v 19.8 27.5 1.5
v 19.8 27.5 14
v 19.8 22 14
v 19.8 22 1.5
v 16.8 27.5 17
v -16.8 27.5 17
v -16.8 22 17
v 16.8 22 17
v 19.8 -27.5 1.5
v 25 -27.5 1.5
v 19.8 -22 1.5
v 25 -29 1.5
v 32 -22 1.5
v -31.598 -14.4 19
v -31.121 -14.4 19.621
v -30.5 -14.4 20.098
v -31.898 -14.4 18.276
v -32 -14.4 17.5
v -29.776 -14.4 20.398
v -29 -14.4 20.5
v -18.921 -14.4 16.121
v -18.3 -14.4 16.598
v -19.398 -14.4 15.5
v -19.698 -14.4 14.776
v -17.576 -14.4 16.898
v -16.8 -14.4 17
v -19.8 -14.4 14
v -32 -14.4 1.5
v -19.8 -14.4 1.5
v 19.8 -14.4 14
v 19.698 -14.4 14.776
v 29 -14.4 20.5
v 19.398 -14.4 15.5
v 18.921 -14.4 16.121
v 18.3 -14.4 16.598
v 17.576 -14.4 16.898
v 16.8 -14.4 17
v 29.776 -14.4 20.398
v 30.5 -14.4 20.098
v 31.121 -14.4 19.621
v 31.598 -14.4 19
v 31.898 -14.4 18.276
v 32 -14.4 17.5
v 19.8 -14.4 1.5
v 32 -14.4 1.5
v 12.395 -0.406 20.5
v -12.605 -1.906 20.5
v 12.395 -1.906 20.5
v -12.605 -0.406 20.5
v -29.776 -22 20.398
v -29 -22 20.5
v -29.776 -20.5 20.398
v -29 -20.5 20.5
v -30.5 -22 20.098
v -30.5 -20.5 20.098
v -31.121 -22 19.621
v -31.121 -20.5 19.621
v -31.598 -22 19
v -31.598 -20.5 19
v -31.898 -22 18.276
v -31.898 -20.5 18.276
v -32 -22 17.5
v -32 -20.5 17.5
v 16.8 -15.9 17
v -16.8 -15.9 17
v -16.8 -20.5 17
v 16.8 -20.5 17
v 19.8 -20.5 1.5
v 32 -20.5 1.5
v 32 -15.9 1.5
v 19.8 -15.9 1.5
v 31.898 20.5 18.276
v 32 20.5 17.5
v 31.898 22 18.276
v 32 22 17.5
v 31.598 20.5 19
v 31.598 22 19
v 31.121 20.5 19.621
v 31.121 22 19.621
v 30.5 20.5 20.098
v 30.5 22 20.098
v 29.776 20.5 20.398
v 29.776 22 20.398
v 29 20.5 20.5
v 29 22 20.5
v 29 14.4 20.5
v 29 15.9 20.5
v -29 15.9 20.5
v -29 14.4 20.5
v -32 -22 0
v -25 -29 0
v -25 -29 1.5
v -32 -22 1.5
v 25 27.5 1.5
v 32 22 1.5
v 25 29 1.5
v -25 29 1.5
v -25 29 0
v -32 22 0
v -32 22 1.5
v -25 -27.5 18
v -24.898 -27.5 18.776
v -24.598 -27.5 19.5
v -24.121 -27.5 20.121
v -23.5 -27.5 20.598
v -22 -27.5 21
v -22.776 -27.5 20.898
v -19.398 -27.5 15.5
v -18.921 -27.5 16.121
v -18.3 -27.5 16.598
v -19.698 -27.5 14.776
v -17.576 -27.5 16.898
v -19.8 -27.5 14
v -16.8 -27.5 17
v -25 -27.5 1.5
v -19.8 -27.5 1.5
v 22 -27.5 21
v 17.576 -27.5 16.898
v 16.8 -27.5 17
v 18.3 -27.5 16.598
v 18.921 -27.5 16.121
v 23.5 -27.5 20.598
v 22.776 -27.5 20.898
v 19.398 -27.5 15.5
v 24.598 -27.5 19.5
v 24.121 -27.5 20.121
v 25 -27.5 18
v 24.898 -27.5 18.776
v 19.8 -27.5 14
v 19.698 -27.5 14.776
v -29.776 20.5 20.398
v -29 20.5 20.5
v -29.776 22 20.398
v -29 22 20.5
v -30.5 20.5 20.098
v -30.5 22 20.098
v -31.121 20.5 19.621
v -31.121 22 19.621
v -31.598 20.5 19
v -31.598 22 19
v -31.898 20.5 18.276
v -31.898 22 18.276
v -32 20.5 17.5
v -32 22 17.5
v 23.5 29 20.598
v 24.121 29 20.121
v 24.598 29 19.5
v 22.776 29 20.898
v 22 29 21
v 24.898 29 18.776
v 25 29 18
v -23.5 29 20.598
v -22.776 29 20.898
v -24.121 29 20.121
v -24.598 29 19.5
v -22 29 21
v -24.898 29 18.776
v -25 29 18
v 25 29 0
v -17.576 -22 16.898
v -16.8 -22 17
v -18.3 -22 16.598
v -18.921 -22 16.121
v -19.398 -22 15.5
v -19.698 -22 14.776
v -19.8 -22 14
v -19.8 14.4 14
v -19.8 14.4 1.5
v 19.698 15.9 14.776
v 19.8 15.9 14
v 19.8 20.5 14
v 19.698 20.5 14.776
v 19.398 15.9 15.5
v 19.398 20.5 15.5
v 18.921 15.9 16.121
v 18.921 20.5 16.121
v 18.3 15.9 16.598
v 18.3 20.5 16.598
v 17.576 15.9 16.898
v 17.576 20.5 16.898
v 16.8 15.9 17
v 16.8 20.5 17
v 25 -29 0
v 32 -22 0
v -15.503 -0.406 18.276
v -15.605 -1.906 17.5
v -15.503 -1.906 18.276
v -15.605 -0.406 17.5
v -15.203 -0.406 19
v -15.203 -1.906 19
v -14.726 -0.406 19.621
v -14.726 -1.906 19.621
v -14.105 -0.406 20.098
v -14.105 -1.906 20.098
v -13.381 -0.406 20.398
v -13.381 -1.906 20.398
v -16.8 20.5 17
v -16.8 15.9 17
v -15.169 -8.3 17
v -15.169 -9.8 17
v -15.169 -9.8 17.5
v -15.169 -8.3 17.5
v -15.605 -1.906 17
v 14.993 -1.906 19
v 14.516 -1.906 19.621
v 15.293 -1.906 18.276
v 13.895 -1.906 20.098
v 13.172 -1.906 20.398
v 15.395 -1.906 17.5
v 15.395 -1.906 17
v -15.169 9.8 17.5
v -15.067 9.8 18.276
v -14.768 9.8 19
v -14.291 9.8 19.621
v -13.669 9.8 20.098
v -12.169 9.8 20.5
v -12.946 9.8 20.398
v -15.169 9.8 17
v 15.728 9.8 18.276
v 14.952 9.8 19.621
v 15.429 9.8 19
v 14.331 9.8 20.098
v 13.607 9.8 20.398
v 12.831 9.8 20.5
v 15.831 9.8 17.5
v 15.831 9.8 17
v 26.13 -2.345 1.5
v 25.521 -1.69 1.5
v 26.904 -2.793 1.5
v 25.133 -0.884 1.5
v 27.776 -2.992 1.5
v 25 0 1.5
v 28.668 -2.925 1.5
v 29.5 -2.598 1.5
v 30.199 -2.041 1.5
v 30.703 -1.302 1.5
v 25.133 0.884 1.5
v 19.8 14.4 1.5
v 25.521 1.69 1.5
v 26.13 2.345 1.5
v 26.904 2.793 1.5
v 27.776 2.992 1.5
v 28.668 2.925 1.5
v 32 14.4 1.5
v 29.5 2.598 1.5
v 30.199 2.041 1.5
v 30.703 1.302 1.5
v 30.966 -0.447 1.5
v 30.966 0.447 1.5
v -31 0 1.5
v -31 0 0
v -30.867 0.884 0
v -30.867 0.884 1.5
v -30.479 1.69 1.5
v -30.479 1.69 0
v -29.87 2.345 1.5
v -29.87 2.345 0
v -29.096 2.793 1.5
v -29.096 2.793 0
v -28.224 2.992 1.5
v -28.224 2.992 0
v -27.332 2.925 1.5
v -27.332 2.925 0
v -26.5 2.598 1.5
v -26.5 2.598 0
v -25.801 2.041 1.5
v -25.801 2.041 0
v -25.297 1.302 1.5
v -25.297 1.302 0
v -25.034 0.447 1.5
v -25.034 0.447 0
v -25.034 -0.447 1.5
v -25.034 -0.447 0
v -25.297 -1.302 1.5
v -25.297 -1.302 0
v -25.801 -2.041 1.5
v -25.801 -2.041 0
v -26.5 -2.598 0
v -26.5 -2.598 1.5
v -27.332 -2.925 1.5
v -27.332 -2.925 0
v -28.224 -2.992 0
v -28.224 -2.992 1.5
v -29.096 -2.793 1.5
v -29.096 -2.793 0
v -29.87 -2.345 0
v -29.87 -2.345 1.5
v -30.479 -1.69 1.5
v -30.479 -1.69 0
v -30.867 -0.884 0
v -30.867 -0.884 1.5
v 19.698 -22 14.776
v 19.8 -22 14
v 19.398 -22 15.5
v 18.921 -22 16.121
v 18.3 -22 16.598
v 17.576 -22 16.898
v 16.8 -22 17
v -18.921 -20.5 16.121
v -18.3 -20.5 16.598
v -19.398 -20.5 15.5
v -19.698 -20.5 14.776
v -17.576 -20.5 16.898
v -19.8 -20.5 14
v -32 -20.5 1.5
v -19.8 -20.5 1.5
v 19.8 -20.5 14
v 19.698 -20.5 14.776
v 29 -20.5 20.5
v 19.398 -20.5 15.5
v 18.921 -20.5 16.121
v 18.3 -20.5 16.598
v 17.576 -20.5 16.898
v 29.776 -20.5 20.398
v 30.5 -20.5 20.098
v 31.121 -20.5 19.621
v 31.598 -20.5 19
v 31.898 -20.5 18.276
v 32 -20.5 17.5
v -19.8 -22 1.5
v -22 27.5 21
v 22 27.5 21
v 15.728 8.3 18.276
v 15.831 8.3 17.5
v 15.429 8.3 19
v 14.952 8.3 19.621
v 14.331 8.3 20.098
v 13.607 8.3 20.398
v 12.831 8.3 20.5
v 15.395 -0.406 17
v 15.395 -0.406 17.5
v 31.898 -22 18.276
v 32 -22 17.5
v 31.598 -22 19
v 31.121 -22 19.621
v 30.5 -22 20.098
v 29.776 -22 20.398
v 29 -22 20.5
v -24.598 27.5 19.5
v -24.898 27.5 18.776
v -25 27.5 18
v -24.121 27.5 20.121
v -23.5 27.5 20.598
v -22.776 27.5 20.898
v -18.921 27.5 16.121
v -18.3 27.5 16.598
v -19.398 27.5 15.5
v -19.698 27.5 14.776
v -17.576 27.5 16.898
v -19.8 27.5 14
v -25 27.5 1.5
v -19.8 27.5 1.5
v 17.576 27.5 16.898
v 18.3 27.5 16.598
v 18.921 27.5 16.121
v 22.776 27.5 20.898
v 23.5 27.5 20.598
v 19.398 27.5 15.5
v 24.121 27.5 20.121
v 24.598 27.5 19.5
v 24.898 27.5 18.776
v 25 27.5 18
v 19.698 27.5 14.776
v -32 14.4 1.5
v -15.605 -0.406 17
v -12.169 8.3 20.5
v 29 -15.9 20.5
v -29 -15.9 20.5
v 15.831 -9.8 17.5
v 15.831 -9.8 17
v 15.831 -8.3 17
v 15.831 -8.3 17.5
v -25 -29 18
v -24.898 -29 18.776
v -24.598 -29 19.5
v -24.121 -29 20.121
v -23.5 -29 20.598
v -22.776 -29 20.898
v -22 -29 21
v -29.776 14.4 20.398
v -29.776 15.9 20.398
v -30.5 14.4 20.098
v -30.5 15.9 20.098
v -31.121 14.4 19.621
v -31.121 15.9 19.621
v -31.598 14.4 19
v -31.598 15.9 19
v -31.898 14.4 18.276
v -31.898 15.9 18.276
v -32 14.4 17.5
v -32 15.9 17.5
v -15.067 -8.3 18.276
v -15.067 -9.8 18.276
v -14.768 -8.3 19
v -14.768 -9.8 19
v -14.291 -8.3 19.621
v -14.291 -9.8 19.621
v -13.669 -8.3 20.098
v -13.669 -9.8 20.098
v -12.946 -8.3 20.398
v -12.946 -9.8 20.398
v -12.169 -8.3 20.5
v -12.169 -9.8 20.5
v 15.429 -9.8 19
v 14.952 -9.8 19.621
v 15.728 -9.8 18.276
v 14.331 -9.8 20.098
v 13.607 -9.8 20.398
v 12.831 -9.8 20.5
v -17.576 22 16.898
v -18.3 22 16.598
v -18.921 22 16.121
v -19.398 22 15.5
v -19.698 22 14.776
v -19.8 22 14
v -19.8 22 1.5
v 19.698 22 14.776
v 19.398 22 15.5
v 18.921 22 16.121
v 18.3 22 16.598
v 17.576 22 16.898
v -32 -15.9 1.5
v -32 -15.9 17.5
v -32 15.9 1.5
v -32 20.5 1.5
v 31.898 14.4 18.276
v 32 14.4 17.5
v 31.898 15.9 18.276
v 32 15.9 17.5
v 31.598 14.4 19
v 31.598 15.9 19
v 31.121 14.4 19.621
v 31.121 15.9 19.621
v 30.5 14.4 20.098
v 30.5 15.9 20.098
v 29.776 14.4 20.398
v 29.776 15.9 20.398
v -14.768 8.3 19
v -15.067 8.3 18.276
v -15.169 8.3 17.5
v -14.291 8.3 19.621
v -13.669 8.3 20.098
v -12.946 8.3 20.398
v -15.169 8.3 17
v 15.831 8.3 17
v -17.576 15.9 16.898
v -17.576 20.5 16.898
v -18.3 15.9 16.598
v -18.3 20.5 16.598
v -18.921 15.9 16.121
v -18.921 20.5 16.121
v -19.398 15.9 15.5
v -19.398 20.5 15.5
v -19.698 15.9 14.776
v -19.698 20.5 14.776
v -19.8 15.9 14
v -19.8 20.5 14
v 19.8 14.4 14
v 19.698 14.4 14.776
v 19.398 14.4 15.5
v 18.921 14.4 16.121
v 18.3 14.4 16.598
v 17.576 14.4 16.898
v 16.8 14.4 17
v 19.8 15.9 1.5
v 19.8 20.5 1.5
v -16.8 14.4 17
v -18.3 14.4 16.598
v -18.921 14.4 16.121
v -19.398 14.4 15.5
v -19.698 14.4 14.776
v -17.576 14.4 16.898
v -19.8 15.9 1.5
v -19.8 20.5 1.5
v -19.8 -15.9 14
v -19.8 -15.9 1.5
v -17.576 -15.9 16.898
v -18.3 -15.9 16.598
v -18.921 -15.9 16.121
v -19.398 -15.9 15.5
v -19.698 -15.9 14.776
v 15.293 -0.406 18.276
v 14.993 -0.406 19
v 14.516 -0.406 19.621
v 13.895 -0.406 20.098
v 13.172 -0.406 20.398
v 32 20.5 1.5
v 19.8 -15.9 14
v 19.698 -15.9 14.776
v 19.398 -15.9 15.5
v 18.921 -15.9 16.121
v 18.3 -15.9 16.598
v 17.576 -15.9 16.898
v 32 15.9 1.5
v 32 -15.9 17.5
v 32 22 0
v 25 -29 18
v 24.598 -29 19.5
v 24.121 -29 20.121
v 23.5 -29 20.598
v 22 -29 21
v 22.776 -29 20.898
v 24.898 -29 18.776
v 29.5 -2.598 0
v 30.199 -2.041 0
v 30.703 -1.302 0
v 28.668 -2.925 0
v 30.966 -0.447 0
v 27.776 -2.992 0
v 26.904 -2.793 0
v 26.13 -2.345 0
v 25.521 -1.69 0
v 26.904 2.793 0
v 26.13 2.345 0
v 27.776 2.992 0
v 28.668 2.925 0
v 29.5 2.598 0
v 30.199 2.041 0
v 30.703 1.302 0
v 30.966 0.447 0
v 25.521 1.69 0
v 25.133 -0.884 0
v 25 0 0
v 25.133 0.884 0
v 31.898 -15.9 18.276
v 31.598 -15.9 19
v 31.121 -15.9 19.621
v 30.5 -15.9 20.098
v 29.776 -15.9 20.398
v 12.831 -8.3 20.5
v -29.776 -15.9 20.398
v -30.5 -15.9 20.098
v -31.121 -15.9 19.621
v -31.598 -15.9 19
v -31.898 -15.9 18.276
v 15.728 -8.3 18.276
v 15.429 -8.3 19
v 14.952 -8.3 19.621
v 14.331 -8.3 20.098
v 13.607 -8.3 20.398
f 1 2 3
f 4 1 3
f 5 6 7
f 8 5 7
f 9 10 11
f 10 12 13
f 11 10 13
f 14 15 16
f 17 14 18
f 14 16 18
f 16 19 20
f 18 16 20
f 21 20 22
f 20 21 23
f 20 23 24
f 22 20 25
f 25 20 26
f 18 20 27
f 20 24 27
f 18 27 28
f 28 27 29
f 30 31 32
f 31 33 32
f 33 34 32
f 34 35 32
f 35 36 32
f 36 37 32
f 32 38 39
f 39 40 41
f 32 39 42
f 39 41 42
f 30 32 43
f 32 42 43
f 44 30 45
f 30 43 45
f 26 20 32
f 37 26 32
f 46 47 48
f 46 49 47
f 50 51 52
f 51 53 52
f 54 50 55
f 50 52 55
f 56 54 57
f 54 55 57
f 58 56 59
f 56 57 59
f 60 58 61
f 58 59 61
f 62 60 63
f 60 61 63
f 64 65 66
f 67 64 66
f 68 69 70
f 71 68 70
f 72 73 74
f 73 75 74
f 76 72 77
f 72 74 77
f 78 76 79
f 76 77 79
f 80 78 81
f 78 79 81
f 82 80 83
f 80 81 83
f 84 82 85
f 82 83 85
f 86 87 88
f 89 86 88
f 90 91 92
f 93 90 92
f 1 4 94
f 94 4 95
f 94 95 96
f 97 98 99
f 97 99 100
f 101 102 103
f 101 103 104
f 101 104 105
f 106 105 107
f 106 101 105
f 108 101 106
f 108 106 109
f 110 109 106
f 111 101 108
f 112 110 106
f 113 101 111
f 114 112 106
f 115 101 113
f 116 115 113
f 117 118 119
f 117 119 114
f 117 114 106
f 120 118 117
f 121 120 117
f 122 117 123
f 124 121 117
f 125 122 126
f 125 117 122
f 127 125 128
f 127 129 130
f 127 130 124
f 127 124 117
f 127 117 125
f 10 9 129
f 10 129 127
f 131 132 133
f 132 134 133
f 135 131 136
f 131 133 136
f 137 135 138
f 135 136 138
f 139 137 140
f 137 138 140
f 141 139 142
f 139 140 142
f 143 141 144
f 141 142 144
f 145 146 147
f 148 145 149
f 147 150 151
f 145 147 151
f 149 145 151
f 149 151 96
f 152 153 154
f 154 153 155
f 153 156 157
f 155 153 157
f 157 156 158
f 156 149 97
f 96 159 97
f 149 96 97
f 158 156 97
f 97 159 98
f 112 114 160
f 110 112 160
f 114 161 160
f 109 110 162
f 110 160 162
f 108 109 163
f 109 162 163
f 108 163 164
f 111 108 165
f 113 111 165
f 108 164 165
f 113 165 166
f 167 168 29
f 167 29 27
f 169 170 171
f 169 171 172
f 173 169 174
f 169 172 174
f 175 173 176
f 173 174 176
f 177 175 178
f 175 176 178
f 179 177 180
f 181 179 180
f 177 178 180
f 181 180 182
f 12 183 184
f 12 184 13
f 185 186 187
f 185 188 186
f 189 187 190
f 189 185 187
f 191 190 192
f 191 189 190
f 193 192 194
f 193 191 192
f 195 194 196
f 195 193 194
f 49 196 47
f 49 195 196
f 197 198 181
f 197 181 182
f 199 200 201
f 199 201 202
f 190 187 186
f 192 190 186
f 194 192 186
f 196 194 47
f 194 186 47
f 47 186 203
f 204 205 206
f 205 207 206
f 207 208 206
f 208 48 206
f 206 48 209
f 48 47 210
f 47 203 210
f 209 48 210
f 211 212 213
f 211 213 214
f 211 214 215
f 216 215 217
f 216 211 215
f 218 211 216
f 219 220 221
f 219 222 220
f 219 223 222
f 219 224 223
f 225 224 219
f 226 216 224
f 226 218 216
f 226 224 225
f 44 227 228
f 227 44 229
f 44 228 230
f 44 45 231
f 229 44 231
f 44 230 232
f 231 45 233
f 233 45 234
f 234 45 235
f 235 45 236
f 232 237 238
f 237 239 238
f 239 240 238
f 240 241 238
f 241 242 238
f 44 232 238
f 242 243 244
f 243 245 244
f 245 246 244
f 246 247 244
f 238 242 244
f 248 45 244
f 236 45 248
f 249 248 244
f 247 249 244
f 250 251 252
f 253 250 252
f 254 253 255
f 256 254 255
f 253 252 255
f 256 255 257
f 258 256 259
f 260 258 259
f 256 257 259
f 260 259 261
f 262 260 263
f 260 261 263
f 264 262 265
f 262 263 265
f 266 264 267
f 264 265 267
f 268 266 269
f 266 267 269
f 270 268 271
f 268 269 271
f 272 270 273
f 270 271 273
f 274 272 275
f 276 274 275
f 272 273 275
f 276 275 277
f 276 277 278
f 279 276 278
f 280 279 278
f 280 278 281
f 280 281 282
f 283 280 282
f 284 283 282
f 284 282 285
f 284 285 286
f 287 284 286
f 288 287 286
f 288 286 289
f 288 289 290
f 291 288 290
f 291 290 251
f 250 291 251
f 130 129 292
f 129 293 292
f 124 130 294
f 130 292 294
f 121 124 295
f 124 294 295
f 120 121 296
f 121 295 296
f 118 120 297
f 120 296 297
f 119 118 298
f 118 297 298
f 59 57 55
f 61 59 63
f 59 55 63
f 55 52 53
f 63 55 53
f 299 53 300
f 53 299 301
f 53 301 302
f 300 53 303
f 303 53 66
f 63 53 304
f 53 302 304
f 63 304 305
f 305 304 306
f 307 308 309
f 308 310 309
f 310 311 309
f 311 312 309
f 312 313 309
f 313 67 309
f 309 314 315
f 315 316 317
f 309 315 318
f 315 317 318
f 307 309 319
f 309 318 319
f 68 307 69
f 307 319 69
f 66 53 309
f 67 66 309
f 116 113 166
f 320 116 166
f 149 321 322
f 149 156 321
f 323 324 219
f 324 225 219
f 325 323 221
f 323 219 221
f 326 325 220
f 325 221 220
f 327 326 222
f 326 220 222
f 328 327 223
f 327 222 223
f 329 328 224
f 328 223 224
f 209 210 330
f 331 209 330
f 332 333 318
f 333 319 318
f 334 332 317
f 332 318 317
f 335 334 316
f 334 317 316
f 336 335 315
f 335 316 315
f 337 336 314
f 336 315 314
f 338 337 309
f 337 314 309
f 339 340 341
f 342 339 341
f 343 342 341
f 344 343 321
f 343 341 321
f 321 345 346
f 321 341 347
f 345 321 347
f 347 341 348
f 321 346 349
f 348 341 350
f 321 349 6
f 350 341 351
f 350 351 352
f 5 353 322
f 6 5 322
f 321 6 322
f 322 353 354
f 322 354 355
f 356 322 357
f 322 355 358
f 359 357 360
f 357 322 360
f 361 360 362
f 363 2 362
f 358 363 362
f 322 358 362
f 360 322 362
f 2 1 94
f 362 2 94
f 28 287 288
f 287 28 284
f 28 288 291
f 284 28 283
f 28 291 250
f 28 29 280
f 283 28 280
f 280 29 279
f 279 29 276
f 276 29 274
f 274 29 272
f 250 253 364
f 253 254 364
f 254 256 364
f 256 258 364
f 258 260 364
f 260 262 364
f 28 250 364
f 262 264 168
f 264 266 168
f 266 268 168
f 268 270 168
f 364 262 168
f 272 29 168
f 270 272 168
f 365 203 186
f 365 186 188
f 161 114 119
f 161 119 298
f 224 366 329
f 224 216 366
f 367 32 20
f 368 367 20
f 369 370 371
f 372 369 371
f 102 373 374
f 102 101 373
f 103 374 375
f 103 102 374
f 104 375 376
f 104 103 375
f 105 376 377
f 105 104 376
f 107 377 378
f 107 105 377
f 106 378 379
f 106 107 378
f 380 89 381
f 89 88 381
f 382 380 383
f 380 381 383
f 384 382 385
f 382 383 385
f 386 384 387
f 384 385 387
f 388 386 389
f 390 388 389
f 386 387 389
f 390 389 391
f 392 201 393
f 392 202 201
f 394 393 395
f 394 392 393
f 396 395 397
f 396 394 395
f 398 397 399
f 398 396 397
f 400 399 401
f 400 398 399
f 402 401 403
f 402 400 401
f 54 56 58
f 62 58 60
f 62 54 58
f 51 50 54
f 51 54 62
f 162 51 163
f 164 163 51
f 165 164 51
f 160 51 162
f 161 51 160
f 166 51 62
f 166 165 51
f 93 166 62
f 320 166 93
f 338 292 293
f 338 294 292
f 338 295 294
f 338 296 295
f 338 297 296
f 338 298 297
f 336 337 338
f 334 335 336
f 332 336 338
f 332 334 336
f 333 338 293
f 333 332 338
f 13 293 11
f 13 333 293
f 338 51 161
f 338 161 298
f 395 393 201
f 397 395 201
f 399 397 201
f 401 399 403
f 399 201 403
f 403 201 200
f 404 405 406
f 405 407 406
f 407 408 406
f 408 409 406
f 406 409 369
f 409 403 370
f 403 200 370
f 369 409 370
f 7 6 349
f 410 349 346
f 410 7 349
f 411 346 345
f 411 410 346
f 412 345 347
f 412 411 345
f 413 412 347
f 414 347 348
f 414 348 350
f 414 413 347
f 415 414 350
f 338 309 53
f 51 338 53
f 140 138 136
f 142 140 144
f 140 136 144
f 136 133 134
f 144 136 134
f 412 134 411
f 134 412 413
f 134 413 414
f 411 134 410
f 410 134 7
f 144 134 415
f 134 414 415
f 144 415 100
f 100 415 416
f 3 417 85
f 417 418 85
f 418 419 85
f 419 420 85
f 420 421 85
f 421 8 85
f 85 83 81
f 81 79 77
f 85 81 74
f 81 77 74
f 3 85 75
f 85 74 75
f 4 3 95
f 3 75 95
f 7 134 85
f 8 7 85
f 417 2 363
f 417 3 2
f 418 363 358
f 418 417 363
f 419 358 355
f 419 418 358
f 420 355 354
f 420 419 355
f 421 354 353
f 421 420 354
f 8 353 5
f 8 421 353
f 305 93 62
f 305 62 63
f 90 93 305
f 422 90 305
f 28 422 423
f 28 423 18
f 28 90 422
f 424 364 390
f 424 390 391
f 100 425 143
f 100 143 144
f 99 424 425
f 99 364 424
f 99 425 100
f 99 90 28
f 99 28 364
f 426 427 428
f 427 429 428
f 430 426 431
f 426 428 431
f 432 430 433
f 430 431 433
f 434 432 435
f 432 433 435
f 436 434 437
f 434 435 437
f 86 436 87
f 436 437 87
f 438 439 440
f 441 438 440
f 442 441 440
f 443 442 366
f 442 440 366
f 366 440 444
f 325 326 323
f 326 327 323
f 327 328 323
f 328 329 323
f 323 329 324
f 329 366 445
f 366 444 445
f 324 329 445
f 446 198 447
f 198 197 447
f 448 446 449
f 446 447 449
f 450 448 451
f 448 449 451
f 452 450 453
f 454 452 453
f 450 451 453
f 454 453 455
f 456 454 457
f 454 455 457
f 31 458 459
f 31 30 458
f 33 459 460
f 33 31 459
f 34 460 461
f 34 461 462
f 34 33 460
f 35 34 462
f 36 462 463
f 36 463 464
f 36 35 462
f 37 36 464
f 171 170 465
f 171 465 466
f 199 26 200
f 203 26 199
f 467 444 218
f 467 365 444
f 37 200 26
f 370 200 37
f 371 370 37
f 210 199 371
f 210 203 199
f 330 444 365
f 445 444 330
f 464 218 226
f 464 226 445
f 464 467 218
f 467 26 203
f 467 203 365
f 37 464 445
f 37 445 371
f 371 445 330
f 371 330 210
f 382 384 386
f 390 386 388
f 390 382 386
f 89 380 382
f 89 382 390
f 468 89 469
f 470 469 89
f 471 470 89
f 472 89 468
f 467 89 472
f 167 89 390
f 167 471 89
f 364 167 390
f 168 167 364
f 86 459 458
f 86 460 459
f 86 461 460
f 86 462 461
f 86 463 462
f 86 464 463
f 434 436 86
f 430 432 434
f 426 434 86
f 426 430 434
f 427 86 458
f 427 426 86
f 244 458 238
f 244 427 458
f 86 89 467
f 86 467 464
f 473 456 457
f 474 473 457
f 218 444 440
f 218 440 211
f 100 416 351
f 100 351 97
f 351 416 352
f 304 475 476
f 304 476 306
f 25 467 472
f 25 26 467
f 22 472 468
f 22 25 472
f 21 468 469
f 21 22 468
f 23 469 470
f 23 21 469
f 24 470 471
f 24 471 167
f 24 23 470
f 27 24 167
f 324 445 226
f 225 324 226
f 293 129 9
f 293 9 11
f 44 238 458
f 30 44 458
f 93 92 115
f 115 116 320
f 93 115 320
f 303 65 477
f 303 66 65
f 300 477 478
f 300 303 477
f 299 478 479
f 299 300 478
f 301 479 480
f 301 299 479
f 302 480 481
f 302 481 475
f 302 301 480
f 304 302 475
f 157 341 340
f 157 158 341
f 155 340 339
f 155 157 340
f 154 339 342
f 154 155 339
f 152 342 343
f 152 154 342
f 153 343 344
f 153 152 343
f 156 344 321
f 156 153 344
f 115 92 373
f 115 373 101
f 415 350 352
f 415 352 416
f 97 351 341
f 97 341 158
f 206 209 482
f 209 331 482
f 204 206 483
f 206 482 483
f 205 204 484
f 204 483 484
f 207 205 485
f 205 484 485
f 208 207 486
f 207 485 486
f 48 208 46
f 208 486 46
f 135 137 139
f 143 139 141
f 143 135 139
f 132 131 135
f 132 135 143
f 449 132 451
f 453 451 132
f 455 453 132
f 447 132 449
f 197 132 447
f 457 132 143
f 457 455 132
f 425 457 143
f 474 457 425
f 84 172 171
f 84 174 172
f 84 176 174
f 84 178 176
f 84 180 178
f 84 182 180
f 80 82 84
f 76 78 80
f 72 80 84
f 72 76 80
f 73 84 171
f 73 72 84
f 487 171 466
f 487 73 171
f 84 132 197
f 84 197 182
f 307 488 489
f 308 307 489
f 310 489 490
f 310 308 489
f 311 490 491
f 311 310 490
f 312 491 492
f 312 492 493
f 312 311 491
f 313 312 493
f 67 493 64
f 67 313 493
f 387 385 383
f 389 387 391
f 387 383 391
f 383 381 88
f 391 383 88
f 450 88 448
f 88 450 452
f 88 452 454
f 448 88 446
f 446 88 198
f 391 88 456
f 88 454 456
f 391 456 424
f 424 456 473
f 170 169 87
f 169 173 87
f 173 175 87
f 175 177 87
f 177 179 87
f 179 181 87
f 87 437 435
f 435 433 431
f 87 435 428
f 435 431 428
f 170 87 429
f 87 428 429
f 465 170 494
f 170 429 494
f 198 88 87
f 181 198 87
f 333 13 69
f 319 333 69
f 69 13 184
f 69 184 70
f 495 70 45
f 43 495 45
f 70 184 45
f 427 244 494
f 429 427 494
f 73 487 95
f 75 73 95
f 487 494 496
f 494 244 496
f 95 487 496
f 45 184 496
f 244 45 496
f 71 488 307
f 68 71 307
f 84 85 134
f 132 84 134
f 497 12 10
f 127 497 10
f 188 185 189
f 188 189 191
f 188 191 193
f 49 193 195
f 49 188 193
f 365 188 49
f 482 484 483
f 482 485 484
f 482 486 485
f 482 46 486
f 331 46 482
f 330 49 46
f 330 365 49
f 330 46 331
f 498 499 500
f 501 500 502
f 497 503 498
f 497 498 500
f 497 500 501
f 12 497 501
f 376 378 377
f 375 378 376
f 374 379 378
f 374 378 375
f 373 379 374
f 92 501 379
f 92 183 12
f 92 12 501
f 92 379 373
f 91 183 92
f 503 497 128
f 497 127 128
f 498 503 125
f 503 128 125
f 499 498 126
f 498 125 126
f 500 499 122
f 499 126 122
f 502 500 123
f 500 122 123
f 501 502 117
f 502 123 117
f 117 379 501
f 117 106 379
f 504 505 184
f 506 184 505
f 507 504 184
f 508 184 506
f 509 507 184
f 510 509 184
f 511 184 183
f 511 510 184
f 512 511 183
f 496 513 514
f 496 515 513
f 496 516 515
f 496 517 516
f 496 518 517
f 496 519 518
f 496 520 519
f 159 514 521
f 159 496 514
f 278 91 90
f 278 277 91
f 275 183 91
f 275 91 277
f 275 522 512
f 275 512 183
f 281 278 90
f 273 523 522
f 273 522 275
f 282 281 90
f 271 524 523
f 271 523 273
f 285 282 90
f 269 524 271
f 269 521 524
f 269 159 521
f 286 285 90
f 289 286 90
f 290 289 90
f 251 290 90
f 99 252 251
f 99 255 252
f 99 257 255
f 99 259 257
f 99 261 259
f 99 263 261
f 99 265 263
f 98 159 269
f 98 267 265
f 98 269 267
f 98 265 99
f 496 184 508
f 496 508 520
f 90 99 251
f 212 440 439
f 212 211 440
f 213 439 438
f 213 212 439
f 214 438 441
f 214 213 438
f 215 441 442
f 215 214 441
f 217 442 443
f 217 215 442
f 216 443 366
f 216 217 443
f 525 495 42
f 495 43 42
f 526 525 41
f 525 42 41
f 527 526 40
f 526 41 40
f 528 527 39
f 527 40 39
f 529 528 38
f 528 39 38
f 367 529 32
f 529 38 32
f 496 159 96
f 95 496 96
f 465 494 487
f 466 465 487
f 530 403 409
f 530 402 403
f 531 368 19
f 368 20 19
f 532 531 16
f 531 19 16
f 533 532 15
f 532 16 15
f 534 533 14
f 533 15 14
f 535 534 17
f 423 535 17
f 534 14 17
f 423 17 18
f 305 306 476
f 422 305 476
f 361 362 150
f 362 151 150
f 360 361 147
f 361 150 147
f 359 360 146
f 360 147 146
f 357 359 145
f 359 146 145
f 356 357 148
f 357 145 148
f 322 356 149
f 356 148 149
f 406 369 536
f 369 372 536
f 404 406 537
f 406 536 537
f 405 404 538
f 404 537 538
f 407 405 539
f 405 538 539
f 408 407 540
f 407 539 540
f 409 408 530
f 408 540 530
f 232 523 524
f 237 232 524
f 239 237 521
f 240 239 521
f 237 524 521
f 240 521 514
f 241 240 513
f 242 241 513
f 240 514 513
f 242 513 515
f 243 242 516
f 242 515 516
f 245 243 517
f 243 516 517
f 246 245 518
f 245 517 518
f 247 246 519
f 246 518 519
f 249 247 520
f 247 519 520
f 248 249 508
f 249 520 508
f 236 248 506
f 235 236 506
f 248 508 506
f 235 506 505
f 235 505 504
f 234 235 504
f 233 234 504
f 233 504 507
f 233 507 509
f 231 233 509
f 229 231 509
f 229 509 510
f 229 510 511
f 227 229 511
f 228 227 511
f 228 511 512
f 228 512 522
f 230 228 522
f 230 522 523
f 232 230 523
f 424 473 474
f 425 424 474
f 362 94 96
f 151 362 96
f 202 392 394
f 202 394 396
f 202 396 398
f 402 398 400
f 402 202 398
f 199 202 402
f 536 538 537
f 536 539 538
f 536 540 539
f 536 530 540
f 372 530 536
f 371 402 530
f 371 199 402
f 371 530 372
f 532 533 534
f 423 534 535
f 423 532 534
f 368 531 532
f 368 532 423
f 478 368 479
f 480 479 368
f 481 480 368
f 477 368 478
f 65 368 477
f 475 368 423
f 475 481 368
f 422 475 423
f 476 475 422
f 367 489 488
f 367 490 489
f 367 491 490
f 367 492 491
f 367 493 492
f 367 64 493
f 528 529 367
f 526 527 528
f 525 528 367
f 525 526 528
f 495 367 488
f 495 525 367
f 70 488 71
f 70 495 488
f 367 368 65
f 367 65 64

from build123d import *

# Parameters (mm, degrees)
SKETCH_1_W            = 64
SKETCH_1_H            = 58
EXTRUDE_1_DEPTH       = 20.5
SKETCH_2_W            = 19
SKETCH_2_H            = 4.6
CUT_EXTRUDE_1_DEPTH   = 74.193237393
SKETCH_3_W            = 19
SKETCH_3_H            = 28.8
CUT_EXTRUDE_2_DEPTH   = 74.193237393
SKETCH_4_W            = 19
SKETCH_4_H            = 4.6
CUT_EXTRUDE_3_DEPTH   = 74.193237393
SKETCH_5_W            = 19
SKETCH_5_H            = 7
CUT_EXTRUDE_4_DEPTH   = 74.193237393
SKETCH_6_W            = 19
SKETCH_6_H            = 7
CUT_EXTRUDE_5_DEPTH   = 74.193237393
SKETCH_7_W            = 39.6
SKETCH_7_H            = 15.5
EXTRUDE_2_DEPTH       = 28.8
SKETCH_8_W            = 50
SKETCH_8_H            = 1.5
EXTRUDE_3_DEPTH       = 19.5
SKETCH_9_W            = 50
SKETCH_9_H            = 1.5
EXTRUDE_4_DEPTH       = 19.5
SKETCH_10_W           = 31
SKETCH_10_H           = 1.5
EXTRUDE_5_DEPTH       = 3.5
SKETCH_11_W           = 31
SKETCH_11_H           = 1.5
EXTRUDE_6_DEPTH       = 3.5
SKETCH_12_W           = 31
SKETCH_12_H           = 1.5
EXTRUDE_7_DEPTH       = 3.5
HOLE_WIZARD_6_0_6_1_D = 6
RIB_1_REACH           = 50.021
SKETCH_15_WALL_W      = 103.541657628
SKETCH_15_WALL_H      = 39.6
RIB_2_REACH           = 50.021
SKETCH_16_WALL_W      = 103.541657628
SKETCH_16_WALL_H      = 39.6
RIB_3_REACH           = 50.021
SKETCH_17_WALL_W      = 102.641657628
SKETCH_17_WALL_H      = 39.6
RIB_4_REACH           = 50.021
SKETCH_18_WALL_W      = 102.641657628
SKETCH_18_WALL_H      = 39.6
CHAMFER_1_SIZE        = 7
FILLET_1_R            = 3


with BuildPart() as part:
    # 草图1 → 凸台-拉伸1 (new body)
    with BuildSketch(Plane(origin=(0, 0, 0), x_dir=(-1, 0, 0), z_dir=(0, 0, -1))):
        Rectangle(SKETCH_1_W, SKETCH_1_H)
    extrude(amount=-EXTRUDE_1_DEPTH)

    # 草图2 → 切除-拉伸1 (cut, through all)
    with BuildSketch(Plane(origin=(32, 0, 0), x_dir=(0, 0, -1), z_dir=(1, 0, 0))):
        with Locations((-11, -18.2)):
            Rectangle(SKETCH_2_W, SKETCH_2_H)
    extrude(amount=-CUT_EXTRUDE_1_DEPTH, mode=Mode.SUBTRACT)

    # 草图3 → 切除-拉伸2 (cut, through all)
    with BuildSketch(Plane(origin=(32, 0, 0), x_dir=(0, 0, -1), z_dir=(1, 0, 0))):
        with Locations((-11, 0)):
            Rectangle(SKETCH_3_W, SKETCH_3_H)
    extrude(amount=-CUT_EXTRUDE_2_DEPTH, mode=Mode.SUBTRACT)

    # 草图4 → 切除-拉伸3 (cut, through all)
    with BuildSketch(Plane(origin=(32, 0, 0), x_dir=(0, 0, -1), z_dir=(1, 0, 0))):
        with Locations((-11, 18.2)):
            Rectangle(SKETCH_4_W, SKETCH_4_H)
    extrude(amount=-CUT_EXTRUDE_3_DEPTH, mode=Mode.SUBTRACT)

    # 草图5 → 切除-拉伸4 (cut, through all)
    with BuildSketch(Plane(origin=(32, 0, 0), x_dir=(0, 0, -1), z_dir=(1, 0, 0))):
        with Locations((-11, 25.5)):
            Rectangle(SKETCH_5_W, SKETCH_5_H)
    extrude(amount=-CUT_EXTRUDE_4_DEPTH, mode=Mode.SUBTRACT)

    # 草图6 → 切除-拉伸5 (cut, through all)
    with BuildSketch(Plane(origin=(32, 0, 0), x_dir=(0, 0, -1), z_dir=(1, 0, 0))):
        with Locations((-11, -25.5)):
            Rectangle(SKETCH_6_W, SKETCH_6_H)
    extrude(amount=-CUT_EXTRUDE_5_DEPTH, mode=Mode.SUBTRACT)

    # 草图7 → 凸台-拉伸2 (add)
    with BuildSketch(Plane.XZ.offset(-14.4)):
        with Locations((0, 9.25)):
            Rectangle(SKETCH_7_W, SKETCH_7_H)
    extrude(amount=EXTRUDE_2_DEPTH)

    # 草图8 → 凸台-拉伸3 (add)
    with BuildSketch(Plane.XY.offset(1.5)):
        with Locations((0, -28.25)):
            Rectangle(SKETCH_8_W, SKETCH_8_H)
    extrude(amount=EXTRUDE_3_DEPTH)

    # 草图9 → 凸台-拉伸4 (add)
    with BuildSketch(Plane.XY.offset(1.5)):
        with Locations((0, 28.25)):
            Rectangle(SKETCH_9_W, SKETCH_9_H)
    extrude(amount=EXTRUDE_4_DEPTH)

    # 草图10 → 凸台-拉伸5 (add)
    with BuildSketch(Plane.XY.offset(17)):
        with Locations((0.330554393, 9.05)):
            Rectangle(SKETCH_10_W, SKETCH_10_H)
    extrude(amount=EXTRUDE_5_DEPTH)

    # 草图11 → 凸台-拉伸6 (add)
    with BuildSketch(Plane.XY.offset(17)):
        with Locations((-0.104926517, -1.15574974)):
            Rectangle(SKETCH_11_W, SKETCH_11_H)
    extrude(amount=EXTRUDE_6_DEPTH)

    # 草图12 → 凸台-拉伸7 (add)
    with BuildSketch(Plane.XY.offset(17)):
        with Locations((0.330554393, -9.05)):
            Rectangle(SKETCH_12_W, SKETCH_12_H)
    extrude(amount=EXTRUDE_7_DEPTH)

    # Ø6.0 (6) 直径孔1 (through all)
    with Locations(Plane.XY.offset(1.5)):
        with Locations((28, 0), (-28, 0)):
            Hole(HOLE_WIZARD_6_0_6_1_D / 2)

    # 草图15 wall → 筋1 (add, up to next)
    with BuildSketch(Plane(origin=(0, 24.75, 17), x_dir=(0, -1, 0), z_dir=(0, 0, -1)), mode=Mode.PRIVATE) as rib_1_sk1:
        Rectangle(SKETCH_15_WALL_W, SKETCH_15_WALL_H)
    rib_1_tool1 = extrude(rib_1_sk1.sketch, amount=RIB_1_REACH, mode=Mode.PRIVATE) - part.part
    add(rib_1_tool1.solids().sort_by_distance((0, 24.75, 17))[0])

    # 草图16 wall → 筋2 (add, up to next)
    with BuildSketch(Plane(origin=(0, -24.75, 17), x_dir=(0, 1, 0), z_dir=(0, 0, -1)), mode=Mode.PRIVATE) as rib_2_sk1:
        Rectangle(SKETCH_16_WALL_W, SKETCH_16_WALL_H)
    rib_2_tool1 = extrude(rib_2_sk1.sketch, amount=RIB_2_REACH, mode=Mode.PRIVATE) - part.part
    add(rib_2_tool1.solids().sort_by_distance((0, -24.75, 17))[0])

    # 草图17 wall → 筋3 (add, up to next)
    with BuildSketch(Plane(origin=(0, 18.2, 17), x_dir=(0, 1, 0), z_dir=(0, 0, -1)), mode=Mode.PRIVATE) as rib_3_sk1:
        Rectangle(SKETCH_17_WALL_W, SKETCH_17_WALL_H)
    rib_3_tool1 = extrude(rib_3_sk1.sketch, amount=RIB_3_REACH, mode=Mode.PRIVATE) - part.part
    add(rib_3_tool1.solids().sort_by_distance((0, 18.2, 17))[0])

    # 草图18 wall → 筋4 (add, up to next)
    with BuildSketch(Plane(origin=(0, -18.2, 17), x_dir=(0, -1, 0), z_dir=(0, 0, -1)), mode=Mode.PRIVATE) as rib_4_sk1:
        Rectangle(SKETCH_18_WALL_W, SKETCH_18_WALL_H)
    rib_4_tool1 = extrude(rib_4_sk1.sketch, amount=RIB_4_REACH, mode=Mode.PRIVATE) - part.part
    add(rib_4_tool1.solids().sort_by_distance((0, -18.2, 17))[0])

    # 倒角1
    chamfer_1_edges = [part.edges().sort_by_distance(p)[0] for p in [
        (-32, 29, 0.75),
        (-32, -29, 0.75),
        (32, 29, 0.75),
        (32, -29, 0.75),
    ]]
    chamfer(chamfer_1_edges, length=CHAMFER_1_SIZE)

    # 圆角1
    fillet_1_edges = [part.edges().sort_by_distance(p)[0] for p in [
        (19.8, 0, 17),
        (-19.8, 0, 17),
        (-25, -28.25, 21),
        (25, -28.25, 21),
        (-25, 28.25, 21),
        (25, 28.25, 21),
        (-15.169445607, 9.05, 20.5),
        (15.830554393, 9.05, 20.5),
        (-32, -15.15, 20.5),
        (32, -21.25, 20.5),
        (-15.604926517, -1.15574974, 20.5),
        (15.395073483, -1.15574974, 20.5),
        (-15.169445607, -9.05, 20.5),
        (15.830554393, -9.05, 20.5),
        (19.8, 24.75, 17),
        (-19.8, 24.75, 17),
        (19.8, -24.75, 17),
        (-19.8, -24.75, 17),
        (32, -15.15, 20.5),
        (-32, 15.15, 20.5),
        (-19.8, 18.2, 17),
        (19.8, 18.2, 17),
        (-19.8, -18.2, 17),
        (19.8, -18.2, 17),
        (32, 15.15, 20.5),
        (-32, 21.25, 20.5),
        (32, 21.25, 20.5),
        (-32, -21.25, 20.5),
    ]]
    fillet(fillet_1_edges, radius=FILLET_1_R)


solid = part.part
